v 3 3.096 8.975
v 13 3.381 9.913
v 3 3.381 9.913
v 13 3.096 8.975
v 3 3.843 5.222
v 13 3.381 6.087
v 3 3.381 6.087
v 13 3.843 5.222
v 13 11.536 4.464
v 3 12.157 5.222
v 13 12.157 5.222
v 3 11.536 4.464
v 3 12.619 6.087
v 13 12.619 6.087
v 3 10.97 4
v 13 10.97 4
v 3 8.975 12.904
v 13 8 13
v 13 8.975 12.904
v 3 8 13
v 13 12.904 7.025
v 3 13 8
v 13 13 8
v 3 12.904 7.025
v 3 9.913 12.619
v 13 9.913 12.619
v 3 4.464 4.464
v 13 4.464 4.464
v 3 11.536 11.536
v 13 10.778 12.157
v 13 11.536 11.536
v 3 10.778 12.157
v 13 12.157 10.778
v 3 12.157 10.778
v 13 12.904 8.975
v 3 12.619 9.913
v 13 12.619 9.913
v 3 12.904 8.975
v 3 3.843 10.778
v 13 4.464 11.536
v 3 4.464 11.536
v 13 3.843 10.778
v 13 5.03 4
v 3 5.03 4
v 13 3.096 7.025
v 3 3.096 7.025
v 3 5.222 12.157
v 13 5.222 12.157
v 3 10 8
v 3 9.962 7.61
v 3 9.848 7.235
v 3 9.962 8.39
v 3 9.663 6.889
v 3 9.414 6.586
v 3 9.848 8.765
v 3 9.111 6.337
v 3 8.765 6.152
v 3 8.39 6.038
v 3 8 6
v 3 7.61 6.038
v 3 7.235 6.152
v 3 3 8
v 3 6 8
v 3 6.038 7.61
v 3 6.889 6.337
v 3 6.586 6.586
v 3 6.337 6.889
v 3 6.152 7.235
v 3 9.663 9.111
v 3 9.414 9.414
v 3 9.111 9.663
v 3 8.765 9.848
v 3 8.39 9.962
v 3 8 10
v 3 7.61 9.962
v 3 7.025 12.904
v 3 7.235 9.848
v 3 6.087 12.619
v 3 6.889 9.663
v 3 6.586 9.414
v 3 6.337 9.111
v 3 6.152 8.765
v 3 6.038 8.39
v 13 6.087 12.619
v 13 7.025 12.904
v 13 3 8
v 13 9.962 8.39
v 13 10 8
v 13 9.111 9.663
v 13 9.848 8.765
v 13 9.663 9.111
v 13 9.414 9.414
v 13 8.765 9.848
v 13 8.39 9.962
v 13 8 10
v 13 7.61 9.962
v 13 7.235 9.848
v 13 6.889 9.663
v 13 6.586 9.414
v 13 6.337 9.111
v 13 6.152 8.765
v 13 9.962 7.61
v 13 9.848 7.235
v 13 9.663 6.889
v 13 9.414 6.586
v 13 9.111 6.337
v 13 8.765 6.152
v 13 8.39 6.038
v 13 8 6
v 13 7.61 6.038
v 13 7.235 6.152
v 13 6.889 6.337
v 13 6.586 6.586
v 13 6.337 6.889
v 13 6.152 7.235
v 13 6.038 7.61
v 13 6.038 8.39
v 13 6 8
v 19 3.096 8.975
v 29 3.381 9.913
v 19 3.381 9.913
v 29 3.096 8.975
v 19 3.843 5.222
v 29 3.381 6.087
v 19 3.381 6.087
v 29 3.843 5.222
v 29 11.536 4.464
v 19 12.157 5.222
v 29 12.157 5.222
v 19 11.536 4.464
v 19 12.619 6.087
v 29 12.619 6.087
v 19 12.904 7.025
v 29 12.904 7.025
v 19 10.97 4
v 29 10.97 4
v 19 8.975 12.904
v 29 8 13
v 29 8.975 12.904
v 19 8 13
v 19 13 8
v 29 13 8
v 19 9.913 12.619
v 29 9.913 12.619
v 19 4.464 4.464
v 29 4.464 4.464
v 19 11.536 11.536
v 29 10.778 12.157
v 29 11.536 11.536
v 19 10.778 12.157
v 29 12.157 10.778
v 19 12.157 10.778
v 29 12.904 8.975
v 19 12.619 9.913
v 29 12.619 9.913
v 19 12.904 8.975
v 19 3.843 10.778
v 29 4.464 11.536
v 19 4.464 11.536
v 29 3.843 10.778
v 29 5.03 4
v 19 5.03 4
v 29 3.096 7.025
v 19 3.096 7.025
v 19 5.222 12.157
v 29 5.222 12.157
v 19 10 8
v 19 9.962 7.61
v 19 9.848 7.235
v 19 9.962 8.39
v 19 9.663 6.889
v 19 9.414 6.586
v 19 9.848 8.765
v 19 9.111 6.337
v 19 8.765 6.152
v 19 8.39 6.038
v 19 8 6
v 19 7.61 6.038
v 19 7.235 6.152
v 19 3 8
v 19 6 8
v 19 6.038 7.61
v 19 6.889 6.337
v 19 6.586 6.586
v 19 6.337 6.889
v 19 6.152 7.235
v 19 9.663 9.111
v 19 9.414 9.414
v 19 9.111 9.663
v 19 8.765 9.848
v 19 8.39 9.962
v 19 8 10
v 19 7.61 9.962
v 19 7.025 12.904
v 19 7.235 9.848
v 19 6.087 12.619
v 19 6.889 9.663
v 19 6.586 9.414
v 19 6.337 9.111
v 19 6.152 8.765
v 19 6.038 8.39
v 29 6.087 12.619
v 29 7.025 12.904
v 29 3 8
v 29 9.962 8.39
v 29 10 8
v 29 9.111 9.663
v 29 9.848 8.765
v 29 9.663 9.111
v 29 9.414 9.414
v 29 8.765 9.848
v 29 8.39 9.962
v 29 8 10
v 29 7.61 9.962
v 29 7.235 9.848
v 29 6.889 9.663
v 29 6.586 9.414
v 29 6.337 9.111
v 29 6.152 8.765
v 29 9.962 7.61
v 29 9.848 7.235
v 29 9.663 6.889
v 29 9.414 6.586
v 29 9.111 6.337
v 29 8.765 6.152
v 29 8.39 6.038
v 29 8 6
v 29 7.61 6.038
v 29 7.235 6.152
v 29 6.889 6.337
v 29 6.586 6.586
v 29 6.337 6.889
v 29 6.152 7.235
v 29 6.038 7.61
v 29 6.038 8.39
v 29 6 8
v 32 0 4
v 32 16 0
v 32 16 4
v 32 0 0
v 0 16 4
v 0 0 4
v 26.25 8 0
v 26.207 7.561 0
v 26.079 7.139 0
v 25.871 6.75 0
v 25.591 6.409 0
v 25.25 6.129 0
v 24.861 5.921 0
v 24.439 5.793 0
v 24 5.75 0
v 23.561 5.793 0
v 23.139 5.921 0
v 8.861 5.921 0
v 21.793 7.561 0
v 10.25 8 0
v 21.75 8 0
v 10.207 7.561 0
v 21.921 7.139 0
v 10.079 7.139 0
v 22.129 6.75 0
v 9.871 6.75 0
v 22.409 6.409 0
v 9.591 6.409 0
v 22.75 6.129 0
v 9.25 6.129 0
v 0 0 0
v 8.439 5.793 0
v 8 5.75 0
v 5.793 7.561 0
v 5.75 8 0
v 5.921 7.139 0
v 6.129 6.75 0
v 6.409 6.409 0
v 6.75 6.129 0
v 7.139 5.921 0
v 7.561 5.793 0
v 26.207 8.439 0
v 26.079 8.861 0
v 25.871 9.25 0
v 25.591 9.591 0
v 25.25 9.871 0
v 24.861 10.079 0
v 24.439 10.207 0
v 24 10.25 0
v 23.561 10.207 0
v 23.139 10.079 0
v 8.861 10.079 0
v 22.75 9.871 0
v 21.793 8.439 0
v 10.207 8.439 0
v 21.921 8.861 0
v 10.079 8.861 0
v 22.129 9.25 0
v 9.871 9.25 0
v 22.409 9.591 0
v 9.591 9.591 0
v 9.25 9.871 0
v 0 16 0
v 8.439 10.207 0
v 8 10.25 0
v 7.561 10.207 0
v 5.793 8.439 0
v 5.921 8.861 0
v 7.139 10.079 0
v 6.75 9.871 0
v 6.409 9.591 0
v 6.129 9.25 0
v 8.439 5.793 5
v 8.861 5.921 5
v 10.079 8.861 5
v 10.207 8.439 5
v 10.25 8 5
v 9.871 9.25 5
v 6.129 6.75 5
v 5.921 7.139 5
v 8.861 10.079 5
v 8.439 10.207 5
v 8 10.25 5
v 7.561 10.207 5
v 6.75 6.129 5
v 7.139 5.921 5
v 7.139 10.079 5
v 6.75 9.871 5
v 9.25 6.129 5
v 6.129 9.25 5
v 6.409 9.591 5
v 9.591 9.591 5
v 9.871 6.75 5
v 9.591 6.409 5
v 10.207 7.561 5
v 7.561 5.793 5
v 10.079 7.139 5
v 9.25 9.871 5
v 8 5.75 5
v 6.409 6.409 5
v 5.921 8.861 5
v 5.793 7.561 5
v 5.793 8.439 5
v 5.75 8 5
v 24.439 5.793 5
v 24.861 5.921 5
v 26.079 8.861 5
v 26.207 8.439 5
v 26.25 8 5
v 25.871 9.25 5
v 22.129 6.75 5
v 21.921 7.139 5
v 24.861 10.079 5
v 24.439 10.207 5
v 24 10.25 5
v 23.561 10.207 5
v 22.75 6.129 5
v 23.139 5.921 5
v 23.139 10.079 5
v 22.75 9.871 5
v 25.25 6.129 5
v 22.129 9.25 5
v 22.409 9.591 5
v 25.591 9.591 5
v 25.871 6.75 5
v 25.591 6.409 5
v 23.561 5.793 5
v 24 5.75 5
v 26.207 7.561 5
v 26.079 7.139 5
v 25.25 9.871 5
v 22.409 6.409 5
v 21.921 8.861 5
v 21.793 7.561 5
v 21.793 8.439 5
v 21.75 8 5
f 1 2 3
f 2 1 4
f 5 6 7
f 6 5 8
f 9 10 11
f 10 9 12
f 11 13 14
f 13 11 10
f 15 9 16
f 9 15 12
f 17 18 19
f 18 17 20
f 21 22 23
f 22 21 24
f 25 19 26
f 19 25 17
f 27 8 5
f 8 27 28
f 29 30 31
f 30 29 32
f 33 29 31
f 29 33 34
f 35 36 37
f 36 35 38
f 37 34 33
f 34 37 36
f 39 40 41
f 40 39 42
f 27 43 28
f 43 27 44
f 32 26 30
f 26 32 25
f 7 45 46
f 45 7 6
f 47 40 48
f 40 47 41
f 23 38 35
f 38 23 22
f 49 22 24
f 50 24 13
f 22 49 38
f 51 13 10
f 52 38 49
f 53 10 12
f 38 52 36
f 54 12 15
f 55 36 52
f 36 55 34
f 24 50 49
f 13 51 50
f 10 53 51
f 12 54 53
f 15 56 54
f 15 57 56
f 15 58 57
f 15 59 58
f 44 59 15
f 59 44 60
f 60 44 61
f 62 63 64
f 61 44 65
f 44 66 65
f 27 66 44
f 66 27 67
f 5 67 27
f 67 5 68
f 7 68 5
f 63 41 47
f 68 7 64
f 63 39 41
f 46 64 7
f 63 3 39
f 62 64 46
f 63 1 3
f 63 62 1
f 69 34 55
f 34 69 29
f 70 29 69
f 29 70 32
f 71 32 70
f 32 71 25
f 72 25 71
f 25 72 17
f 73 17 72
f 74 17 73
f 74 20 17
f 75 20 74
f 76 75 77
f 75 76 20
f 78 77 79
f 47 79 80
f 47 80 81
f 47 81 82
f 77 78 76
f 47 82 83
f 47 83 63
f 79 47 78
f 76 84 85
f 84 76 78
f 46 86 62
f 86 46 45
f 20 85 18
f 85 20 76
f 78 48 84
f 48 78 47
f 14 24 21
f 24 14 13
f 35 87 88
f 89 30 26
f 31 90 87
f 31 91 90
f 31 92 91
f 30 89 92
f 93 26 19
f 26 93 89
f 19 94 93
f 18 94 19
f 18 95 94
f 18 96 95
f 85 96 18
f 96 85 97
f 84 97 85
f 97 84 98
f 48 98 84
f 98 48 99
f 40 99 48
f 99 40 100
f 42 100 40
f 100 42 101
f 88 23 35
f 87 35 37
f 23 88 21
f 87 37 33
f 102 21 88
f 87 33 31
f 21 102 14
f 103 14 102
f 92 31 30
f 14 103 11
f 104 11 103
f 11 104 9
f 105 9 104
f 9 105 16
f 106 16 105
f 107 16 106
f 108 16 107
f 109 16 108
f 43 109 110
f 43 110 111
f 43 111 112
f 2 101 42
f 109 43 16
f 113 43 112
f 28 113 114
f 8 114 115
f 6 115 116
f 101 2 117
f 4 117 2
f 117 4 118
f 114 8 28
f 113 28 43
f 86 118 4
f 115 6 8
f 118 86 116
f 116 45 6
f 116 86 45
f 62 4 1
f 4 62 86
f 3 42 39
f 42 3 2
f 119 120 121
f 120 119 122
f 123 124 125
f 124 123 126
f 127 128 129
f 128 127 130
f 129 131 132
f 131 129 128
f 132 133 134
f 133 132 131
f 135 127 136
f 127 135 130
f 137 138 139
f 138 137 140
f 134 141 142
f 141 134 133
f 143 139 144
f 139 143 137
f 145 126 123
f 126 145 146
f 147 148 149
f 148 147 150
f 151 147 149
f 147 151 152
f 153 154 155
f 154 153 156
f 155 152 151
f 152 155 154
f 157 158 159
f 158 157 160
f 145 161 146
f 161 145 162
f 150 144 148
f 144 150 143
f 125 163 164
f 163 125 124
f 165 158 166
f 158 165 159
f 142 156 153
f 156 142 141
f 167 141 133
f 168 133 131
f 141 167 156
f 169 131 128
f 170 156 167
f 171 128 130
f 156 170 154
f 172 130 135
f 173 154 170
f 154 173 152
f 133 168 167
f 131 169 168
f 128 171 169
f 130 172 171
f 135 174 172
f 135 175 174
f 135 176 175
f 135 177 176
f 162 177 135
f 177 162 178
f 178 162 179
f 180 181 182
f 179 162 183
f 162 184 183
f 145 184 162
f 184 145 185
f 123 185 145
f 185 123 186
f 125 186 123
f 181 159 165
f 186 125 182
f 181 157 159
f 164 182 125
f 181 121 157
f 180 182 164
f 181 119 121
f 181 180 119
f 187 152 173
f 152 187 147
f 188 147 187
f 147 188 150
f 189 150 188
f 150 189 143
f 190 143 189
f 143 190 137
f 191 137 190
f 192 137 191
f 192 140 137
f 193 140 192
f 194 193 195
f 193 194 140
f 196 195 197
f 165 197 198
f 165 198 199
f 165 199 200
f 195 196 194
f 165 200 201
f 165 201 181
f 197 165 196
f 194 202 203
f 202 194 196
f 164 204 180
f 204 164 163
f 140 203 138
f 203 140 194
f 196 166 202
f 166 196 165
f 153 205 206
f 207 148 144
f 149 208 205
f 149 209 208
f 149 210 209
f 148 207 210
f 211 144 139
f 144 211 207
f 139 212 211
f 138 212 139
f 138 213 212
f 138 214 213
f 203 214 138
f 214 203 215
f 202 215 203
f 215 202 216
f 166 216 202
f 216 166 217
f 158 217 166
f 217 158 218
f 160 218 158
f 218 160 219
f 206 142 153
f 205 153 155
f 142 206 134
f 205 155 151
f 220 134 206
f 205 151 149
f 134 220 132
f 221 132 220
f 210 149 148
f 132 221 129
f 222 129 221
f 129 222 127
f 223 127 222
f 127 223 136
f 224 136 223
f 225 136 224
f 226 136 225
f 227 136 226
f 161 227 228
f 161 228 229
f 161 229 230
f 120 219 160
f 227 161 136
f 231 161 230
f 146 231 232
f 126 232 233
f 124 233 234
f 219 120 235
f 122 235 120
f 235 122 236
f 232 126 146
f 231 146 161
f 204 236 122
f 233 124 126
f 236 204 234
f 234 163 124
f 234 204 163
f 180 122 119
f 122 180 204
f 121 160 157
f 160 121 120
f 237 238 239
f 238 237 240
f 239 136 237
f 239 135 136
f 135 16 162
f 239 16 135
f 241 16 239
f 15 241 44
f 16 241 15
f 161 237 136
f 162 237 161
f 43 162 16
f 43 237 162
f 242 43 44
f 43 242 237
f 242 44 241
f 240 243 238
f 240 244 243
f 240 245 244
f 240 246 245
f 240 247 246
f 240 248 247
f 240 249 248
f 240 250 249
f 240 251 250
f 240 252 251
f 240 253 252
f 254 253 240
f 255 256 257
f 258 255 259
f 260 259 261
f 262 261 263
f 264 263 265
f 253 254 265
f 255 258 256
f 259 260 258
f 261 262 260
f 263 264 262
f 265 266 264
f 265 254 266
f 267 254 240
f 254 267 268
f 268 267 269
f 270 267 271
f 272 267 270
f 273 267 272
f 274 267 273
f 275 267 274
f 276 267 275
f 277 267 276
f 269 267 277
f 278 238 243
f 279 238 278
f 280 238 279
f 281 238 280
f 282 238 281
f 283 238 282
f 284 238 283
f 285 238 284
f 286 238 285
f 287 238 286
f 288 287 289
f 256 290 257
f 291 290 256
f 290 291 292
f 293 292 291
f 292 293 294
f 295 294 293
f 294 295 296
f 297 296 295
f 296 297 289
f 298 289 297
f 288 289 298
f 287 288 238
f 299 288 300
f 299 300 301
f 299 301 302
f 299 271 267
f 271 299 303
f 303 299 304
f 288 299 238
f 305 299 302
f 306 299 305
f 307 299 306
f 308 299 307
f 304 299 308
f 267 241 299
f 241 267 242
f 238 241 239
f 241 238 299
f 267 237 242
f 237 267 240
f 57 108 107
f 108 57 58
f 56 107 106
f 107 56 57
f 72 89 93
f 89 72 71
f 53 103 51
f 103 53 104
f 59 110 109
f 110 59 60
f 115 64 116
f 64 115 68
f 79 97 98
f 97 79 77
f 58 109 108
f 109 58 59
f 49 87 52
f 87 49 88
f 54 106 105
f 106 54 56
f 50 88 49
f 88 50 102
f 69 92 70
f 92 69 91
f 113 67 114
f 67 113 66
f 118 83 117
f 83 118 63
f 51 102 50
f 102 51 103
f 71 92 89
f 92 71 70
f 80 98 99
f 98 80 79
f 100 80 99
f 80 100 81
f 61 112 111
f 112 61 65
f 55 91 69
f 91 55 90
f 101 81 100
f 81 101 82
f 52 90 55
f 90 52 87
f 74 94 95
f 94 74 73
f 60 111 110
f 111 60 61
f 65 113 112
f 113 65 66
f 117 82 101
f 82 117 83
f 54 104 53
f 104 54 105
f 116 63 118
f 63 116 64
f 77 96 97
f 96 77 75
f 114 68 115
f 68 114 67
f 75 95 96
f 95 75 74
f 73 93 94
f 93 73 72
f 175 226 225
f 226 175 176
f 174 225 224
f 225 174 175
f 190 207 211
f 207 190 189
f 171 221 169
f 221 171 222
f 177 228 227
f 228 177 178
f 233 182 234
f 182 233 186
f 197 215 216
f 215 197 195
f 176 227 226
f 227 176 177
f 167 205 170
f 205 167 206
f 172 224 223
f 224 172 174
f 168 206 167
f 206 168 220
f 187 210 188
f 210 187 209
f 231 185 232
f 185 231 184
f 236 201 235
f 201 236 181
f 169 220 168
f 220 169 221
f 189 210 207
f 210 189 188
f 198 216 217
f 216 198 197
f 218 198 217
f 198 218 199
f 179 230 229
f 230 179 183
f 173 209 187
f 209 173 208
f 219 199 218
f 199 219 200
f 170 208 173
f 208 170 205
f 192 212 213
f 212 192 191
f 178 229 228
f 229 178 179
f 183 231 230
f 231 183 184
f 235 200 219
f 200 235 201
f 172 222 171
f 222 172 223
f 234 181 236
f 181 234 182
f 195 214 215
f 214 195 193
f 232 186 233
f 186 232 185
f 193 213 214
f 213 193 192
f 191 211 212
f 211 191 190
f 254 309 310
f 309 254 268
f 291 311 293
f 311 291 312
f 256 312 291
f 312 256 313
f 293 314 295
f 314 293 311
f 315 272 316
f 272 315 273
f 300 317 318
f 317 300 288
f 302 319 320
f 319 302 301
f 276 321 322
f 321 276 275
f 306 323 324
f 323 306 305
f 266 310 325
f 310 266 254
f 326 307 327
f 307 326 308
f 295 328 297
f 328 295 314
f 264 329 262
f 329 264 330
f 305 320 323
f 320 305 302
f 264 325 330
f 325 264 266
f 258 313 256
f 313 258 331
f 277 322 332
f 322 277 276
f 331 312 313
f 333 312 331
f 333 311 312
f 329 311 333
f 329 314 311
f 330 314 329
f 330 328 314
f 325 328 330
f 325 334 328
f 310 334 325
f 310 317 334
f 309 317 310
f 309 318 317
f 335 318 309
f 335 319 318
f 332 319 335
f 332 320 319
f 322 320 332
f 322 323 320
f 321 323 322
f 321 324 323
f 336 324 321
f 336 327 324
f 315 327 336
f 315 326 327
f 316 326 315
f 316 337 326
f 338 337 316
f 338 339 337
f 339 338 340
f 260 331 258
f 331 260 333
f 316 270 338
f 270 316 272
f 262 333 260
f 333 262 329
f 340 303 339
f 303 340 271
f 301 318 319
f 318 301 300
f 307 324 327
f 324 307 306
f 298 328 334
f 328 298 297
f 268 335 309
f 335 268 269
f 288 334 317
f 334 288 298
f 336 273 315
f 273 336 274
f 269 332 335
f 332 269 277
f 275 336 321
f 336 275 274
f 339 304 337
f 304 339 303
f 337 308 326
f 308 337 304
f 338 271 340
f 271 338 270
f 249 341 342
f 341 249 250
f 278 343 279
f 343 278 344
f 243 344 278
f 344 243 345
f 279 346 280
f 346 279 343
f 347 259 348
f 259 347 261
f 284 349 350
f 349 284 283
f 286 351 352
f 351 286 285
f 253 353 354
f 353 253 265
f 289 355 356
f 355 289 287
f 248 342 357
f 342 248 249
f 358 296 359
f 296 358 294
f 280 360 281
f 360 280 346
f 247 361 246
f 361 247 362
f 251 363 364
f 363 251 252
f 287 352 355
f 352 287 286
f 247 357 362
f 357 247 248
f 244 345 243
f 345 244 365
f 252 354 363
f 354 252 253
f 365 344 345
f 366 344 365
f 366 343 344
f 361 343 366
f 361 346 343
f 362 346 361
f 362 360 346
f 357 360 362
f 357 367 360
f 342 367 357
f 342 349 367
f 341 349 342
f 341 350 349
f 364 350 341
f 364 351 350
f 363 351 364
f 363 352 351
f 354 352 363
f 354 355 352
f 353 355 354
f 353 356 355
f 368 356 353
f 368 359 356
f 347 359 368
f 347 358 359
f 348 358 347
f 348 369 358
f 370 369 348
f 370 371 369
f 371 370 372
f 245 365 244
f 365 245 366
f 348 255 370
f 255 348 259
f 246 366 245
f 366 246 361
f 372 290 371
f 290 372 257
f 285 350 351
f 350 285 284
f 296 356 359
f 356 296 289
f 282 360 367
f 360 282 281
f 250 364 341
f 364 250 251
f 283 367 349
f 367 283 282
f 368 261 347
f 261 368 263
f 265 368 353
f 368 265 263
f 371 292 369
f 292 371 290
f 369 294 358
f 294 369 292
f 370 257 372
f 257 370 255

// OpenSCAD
$fn = 32;

// ----------------------------------------------------------------------
// Cable clip: cable 4 mm, clamp 10 mm, base 32 mm
// ----------------------------------------------------------------------

// --- parameters (mm) ---
plate_x = 32;             // base length, X
plate_y = 16;             // base width, Y
plate_t = 4;              // base thickness
wire_seat_d = 10;         // clamp outside diameter
clip_t = 3;               // clamp wall
cable_d = 4;              // cable opening
ring_w = 10;              // clamp width along the cable
screw_d = 4.5;            // screw clearance
sink = 1;                 // overlap of the clamp into the base
pitch = 16;               // distance between the two clamps

module base() {
  cube([plate_x, plate_y, plate_t]);
}

module clamps() {
  for (sx = [-1, 1])
    translate([plate_x / 2 + sx * pitch / 2, plate_y / 2, plate_t + wire_seat_d / 2 - sink]) rotate([0, 90, 0])
      cylinder(h = ring_w, d = wire_seat_d, center = true);
}

difference() {
  union() {
    base();
    clamps();
  }
  for (sx = [-1, 1])
    translate([plate_x / 2 + sx * pitch / 2, plate_y / 2, plate_t + wire_seat_d / 2 - sink]) rotate([0, 90, 0]) translate([0, 0, -ring_w / 2 - 1]) cylinder(h = ring_w + 2, d = cable_d);
  translate([8, plate_y / 2, -1]) cylinder(h = plate_t + 2, d = screw_d);
  translate([24, plate_y / 2, -1]) cylinder(h = plate_t + 2, d = screw_d);
}
